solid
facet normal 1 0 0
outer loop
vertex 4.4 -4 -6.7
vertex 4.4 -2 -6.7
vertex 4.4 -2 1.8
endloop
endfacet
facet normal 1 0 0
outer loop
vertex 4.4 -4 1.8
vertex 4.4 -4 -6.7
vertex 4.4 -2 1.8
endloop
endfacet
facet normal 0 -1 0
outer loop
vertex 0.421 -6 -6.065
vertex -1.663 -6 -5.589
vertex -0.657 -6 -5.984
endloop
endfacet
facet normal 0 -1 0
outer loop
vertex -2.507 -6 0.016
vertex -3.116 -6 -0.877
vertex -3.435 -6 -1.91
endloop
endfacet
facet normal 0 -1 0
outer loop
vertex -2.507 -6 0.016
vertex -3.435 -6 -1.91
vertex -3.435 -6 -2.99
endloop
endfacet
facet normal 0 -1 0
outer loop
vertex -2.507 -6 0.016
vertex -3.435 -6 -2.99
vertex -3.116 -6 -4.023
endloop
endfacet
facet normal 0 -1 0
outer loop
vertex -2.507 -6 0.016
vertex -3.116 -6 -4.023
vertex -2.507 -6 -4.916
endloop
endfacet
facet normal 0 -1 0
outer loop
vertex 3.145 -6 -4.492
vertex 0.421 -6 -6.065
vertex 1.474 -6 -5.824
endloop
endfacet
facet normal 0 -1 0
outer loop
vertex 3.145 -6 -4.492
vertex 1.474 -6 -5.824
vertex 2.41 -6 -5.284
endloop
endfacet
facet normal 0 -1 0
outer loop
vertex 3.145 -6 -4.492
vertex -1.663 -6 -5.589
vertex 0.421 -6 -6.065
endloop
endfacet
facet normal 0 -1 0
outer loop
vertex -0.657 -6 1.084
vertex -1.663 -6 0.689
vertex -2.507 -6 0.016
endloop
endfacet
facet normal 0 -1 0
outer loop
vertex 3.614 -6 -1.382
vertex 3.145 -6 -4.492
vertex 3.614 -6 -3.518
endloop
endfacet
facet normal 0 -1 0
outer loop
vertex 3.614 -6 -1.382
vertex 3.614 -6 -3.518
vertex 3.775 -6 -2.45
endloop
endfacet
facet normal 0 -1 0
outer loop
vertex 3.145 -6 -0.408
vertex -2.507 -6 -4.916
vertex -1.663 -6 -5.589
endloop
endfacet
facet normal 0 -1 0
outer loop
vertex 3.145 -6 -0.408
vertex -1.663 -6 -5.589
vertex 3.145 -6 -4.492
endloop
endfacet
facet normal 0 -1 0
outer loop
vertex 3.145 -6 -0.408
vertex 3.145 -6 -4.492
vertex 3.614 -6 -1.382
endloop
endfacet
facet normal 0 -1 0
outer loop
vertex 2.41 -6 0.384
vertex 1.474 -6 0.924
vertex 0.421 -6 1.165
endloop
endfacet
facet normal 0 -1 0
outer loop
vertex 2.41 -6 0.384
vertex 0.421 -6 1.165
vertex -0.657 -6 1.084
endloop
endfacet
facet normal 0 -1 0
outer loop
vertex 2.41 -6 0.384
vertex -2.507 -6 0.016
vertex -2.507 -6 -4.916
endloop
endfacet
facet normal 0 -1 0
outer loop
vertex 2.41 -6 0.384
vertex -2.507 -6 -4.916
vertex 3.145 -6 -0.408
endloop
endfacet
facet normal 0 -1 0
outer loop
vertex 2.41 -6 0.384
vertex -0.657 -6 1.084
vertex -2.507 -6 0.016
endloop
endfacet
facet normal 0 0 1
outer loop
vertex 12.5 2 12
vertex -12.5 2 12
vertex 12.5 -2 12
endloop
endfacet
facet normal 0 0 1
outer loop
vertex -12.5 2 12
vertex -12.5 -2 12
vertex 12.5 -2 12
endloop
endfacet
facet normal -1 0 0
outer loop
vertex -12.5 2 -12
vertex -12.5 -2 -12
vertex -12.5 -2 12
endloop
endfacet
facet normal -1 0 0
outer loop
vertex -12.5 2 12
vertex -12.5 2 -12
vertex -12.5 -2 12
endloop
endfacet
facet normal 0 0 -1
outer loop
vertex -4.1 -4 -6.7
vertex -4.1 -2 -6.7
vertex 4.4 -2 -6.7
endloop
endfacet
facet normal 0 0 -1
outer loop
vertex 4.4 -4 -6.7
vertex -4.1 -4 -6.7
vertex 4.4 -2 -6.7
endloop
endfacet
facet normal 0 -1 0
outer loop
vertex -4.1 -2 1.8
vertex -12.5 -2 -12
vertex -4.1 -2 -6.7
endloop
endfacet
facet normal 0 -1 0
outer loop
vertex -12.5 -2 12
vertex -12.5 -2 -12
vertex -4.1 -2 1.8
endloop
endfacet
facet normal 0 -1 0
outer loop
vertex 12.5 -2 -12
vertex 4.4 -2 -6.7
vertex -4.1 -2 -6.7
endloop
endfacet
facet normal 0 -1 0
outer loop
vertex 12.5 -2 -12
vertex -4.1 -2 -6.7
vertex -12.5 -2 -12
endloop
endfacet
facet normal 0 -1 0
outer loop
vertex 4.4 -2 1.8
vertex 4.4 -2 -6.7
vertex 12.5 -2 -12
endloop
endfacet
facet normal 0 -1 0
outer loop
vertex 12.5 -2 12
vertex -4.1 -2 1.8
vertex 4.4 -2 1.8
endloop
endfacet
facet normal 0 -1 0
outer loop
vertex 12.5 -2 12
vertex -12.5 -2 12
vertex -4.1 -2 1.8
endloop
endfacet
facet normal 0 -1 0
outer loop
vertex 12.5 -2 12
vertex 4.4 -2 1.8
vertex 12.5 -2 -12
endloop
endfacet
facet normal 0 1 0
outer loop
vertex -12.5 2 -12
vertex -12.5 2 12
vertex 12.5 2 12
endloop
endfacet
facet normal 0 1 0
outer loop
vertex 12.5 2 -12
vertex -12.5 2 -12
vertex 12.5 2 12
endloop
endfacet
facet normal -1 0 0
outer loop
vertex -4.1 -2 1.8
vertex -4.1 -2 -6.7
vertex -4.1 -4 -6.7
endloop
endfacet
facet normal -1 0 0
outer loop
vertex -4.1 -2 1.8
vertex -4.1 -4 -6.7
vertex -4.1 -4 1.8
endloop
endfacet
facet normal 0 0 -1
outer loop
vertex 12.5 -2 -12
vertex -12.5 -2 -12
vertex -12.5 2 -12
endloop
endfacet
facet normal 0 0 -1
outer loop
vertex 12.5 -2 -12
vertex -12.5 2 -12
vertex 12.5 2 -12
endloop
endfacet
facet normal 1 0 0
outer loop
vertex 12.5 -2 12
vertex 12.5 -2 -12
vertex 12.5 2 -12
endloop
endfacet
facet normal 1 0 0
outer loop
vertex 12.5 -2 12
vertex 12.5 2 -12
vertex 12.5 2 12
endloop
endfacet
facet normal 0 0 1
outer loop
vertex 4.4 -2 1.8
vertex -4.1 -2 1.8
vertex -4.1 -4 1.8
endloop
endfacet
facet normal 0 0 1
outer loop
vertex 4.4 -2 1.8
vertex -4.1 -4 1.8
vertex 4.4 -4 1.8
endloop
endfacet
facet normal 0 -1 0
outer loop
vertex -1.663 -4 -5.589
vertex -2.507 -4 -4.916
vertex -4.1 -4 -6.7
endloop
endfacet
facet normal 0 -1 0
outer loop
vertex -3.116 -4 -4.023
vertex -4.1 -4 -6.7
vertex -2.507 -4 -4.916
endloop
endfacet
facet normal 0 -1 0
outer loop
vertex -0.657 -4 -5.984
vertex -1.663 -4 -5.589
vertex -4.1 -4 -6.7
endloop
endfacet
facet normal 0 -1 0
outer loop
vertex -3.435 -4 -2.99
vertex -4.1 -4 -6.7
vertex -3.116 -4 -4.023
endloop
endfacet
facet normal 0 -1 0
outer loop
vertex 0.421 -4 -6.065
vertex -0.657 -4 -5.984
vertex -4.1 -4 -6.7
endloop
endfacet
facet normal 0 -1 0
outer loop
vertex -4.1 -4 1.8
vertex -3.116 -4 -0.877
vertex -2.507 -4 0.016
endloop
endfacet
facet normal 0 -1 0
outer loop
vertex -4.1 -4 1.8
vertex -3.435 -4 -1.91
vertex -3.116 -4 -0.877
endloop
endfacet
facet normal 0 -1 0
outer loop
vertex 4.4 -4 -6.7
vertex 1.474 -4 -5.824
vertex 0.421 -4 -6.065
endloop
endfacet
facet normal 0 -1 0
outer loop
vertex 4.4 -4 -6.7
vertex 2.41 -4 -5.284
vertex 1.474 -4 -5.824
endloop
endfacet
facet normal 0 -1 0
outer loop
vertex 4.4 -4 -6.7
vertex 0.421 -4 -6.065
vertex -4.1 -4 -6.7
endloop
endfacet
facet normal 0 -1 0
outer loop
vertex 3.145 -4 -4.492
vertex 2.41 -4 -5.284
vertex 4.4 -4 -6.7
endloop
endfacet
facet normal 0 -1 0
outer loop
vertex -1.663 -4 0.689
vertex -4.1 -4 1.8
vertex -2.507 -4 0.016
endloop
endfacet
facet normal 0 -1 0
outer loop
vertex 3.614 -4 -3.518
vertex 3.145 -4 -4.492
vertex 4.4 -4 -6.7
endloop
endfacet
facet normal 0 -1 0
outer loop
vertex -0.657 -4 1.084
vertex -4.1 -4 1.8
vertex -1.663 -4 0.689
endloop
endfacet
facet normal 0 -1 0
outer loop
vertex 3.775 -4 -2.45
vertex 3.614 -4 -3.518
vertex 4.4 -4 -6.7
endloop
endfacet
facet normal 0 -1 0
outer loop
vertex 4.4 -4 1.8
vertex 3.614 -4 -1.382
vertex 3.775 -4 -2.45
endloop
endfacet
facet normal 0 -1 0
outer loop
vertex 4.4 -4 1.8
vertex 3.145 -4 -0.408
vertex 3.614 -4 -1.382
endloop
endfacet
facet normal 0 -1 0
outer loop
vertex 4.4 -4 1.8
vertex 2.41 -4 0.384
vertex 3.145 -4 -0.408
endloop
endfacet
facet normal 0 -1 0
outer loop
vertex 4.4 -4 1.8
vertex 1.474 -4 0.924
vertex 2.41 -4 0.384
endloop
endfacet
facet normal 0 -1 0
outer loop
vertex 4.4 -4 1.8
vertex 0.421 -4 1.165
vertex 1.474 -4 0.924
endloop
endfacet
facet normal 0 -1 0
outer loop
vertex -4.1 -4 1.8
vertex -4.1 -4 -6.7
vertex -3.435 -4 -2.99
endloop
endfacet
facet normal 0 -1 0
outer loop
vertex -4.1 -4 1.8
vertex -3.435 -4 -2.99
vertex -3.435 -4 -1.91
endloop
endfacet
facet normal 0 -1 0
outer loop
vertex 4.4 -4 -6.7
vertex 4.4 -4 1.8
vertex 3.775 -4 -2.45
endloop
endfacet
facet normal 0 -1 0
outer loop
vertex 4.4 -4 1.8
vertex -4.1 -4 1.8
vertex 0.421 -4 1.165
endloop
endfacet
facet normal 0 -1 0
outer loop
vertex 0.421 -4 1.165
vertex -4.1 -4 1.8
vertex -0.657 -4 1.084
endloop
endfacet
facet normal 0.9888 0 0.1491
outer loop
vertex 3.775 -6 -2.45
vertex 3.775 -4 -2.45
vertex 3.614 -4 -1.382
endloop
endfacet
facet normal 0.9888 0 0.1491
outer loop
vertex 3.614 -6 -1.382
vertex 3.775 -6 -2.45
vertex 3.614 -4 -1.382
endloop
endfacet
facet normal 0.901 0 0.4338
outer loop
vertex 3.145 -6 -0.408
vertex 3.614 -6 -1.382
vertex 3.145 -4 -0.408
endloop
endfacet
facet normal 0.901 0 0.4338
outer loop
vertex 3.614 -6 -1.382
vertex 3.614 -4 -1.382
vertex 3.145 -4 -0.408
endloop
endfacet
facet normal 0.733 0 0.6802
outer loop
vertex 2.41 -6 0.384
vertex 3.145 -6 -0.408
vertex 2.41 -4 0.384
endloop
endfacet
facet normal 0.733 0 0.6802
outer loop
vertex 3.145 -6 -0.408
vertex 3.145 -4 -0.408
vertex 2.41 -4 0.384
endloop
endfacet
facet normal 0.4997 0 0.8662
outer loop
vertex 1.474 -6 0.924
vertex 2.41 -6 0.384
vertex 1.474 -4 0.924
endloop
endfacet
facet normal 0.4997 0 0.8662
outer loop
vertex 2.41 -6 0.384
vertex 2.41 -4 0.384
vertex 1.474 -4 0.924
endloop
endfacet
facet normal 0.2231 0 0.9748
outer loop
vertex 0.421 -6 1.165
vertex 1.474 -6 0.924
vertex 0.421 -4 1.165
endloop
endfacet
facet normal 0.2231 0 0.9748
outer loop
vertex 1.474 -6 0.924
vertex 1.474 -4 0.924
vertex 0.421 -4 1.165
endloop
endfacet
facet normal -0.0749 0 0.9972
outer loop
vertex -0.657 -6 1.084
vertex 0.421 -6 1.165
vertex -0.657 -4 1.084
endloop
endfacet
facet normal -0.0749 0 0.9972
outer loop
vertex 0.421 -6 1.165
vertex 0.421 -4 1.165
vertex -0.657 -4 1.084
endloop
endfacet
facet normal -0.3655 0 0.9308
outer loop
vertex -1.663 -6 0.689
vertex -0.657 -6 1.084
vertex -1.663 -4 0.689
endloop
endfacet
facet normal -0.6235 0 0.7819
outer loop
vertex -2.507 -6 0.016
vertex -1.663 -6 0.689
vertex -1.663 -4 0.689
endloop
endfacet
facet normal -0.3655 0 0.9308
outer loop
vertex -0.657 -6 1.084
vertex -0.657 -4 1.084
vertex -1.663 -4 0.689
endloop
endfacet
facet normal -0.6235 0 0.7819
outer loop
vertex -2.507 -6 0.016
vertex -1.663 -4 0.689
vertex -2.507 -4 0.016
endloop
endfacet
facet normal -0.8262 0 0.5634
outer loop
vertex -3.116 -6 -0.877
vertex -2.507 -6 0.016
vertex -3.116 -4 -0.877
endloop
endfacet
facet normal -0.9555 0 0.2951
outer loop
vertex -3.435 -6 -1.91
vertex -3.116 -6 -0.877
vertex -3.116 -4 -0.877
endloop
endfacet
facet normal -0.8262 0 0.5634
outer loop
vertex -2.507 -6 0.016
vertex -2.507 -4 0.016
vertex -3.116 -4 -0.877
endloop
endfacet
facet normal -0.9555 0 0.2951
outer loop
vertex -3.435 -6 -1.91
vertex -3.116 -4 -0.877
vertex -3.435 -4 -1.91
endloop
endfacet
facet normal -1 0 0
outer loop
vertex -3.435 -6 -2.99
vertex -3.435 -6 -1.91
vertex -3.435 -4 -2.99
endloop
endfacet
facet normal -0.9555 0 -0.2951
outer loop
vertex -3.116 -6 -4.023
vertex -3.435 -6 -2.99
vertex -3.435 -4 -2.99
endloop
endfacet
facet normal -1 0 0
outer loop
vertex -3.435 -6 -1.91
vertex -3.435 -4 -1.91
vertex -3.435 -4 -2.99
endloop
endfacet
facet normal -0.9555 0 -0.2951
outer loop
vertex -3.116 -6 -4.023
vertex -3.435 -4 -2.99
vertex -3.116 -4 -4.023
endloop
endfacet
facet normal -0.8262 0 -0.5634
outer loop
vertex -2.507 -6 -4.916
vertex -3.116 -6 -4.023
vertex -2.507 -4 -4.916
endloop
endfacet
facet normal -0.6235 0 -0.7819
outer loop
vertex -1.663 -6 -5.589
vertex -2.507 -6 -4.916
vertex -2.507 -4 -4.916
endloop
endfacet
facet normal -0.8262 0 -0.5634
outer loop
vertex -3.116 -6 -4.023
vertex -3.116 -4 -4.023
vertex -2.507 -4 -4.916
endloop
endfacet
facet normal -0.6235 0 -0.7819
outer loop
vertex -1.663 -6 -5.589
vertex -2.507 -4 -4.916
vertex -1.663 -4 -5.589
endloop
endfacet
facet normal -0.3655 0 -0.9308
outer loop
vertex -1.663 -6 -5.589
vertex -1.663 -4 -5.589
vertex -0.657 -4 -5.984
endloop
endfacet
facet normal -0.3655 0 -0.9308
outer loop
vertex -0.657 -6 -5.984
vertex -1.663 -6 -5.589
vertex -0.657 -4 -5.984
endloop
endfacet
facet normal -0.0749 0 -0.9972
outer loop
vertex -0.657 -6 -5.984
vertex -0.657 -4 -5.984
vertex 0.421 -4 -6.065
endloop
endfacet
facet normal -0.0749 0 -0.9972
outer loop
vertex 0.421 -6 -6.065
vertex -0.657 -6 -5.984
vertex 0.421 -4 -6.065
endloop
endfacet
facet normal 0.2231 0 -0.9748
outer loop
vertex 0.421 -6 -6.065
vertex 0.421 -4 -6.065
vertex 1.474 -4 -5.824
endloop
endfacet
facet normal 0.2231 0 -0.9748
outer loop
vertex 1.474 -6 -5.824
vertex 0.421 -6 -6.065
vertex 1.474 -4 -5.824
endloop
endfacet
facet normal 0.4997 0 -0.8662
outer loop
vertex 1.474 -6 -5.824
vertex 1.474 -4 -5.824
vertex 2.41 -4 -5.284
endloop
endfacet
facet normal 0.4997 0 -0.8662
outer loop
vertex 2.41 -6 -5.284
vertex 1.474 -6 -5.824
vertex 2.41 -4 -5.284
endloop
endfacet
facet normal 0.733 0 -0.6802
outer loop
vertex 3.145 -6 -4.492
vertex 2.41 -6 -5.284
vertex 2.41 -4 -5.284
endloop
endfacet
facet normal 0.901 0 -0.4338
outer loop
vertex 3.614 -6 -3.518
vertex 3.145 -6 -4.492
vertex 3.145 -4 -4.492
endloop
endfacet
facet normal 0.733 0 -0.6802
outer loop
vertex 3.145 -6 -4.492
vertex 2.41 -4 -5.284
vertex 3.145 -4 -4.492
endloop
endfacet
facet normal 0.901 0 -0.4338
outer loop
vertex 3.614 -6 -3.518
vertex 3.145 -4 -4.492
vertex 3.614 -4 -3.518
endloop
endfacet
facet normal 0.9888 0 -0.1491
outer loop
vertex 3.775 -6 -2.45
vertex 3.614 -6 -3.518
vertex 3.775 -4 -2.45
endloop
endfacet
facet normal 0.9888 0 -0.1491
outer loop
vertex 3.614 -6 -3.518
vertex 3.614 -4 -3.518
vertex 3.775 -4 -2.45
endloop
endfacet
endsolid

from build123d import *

# Parameters (mm, degrees)
F0_W     = 25
F0_H     = 24
F1_DEPTH = 2
F2_W     = 8.5
F2_H     = 8.5
F3_DEPTH = 2
F4_R     = 3.625
F5_DEPTH = 2


with BuildPart() as f1:
    # F0 (on Front) → F1 (new body, symmetric)
    with BuildSketch(Plane.XZ):
        Rectangle(F0_W, F0_H)
    extrude(amount=F1_DEPTH, both=True)

    # F2 (on face) → F3 (join)
    with BuildSketch(Plane.XZ.offset(2)):
        with Locations((0.15, -2.45)):
            Rectangle(F2_W, F2_H)
    extrude(amount=F3_DEPTH)

    # F4 (on face) → F5 (join)
    with BuildSketch(Plane.XZ.offset(4)):
        with Locations((0.15, -2.45)):
            Circle(F4_R)
    extrude(amount=F5_DEPTH)


solid = f1.part
